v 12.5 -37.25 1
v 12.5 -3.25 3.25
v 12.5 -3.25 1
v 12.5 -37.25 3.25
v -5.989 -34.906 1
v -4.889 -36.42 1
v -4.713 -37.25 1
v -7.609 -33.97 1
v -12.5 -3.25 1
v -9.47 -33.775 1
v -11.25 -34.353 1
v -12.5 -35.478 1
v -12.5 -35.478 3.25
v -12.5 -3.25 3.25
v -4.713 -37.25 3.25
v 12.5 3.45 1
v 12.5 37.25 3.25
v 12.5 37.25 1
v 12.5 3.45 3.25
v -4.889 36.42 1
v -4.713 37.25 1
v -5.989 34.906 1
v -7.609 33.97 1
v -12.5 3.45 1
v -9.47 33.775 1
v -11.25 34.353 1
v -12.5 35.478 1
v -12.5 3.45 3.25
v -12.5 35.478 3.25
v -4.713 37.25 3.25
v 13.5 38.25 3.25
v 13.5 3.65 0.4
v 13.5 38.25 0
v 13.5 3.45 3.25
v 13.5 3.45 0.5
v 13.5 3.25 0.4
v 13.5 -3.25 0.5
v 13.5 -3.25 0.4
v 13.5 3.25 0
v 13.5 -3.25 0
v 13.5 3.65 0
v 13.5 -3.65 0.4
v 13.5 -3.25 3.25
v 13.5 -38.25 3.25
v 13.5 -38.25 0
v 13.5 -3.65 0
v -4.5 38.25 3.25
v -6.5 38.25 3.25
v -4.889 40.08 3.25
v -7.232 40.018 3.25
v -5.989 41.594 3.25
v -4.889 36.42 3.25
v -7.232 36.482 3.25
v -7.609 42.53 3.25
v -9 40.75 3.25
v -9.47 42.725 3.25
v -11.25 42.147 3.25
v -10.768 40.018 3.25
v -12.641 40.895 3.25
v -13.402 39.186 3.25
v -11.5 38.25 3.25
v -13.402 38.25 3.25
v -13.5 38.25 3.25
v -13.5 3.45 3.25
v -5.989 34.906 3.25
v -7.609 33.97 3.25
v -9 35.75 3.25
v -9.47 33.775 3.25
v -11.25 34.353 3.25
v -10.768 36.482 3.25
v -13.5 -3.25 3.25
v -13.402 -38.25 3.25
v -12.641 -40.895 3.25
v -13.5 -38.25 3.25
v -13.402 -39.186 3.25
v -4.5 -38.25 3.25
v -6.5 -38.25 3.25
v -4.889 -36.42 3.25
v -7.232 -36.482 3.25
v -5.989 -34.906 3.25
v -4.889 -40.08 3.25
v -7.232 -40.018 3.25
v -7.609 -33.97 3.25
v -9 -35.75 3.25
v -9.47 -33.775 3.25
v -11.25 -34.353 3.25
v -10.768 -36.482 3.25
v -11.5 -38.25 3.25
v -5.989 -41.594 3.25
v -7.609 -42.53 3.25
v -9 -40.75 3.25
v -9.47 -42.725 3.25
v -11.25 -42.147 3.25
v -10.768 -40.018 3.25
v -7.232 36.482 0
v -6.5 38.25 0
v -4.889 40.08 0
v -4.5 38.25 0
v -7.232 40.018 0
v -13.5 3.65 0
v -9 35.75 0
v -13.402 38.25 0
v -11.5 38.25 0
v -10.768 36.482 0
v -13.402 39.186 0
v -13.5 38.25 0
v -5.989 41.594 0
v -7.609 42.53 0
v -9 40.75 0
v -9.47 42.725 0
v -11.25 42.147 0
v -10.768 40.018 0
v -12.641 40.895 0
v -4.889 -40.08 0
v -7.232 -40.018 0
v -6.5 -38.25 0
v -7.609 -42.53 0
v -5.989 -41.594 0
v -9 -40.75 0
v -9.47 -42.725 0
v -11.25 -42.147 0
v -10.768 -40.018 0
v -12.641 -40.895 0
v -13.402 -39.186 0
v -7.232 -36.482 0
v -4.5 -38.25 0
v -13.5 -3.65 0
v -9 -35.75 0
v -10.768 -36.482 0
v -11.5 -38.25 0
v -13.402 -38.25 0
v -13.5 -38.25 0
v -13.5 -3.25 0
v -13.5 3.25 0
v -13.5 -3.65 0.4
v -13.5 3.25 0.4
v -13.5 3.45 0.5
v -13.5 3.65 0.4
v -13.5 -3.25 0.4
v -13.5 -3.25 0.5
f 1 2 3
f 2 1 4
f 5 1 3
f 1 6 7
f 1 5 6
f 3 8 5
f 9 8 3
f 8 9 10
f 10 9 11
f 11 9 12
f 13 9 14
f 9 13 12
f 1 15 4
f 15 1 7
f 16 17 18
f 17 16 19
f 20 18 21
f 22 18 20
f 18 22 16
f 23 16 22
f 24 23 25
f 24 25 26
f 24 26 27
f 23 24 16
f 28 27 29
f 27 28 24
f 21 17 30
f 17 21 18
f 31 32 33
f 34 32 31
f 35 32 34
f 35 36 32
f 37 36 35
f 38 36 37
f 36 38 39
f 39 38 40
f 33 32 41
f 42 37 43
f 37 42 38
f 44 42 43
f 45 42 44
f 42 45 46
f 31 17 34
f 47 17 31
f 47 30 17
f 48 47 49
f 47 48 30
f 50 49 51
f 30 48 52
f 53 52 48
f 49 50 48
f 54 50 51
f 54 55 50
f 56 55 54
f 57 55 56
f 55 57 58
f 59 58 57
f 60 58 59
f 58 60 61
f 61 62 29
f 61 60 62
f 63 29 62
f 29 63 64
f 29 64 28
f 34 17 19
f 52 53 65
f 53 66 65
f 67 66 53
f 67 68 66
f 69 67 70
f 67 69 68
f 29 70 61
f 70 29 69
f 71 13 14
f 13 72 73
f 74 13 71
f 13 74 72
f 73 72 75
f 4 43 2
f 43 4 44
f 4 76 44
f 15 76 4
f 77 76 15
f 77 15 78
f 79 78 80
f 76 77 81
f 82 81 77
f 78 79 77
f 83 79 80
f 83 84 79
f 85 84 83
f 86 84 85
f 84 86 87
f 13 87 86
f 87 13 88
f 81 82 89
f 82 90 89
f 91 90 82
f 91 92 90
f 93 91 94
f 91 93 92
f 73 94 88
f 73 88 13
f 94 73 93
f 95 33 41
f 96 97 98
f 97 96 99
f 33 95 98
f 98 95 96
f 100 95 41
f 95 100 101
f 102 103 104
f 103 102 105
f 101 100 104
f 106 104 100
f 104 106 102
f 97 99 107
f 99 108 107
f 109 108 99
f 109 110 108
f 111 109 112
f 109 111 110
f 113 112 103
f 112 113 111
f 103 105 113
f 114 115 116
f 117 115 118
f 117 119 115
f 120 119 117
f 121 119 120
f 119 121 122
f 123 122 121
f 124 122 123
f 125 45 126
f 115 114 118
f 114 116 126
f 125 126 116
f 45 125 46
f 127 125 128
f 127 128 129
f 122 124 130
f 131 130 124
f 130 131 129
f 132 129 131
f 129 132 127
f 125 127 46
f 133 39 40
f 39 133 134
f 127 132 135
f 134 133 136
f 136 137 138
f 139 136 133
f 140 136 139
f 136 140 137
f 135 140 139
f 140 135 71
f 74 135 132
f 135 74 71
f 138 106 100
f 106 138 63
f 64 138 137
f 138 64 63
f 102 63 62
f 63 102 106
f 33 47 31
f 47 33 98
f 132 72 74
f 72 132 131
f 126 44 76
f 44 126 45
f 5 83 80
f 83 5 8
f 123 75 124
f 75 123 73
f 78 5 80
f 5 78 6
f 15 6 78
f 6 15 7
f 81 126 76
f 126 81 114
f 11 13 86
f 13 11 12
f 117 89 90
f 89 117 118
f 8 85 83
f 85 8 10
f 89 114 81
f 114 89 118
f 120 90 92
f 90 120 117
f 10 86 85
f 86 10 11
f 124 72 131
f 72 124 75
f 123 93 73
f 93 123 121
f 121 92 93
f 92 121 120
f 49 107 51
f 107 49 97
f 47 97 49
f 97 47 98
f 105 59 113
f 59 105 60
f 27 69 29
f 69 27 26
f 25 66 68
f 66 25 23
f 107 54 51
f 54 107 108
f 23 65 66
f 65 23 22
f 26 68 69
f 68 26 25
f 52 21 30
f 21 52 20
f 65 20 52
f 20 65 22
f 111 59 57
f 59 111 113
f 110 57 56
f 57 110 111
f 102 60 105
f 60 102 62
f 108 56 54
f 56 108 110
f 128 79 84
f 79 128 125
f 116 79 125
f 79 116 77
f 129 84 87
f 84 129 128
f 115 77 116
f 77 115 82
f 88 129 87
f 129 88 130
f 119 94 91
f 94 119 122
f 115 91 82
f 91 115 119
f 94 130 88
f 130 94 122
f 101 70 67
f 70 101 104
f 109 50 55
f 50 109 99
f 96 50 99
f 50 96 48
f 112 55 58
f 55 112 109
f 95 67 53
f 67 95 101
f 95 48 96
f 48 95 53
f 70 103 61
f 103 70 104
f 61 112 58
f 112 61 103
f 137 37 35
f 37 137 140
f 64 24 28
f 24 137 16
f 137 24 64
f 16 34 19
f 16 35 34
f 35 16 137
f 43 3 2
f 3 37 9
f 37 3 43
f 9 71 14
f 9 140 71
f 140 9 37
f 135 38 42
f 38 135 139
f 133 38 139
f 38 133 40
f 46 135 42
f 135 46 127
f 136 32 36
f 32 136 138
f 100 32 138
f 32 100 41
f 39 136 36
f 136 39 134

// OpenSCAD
/* [Cards] */
// The number of SD cards you want to fit inside
number_of_cards = 2; // [1,2,3]

// The width of the SD card (mm)
card_width = 25; // [10:50]
// The height of the SD card (mm)
card_height = 34; // [10:50]
// The depth of the SD card (mm)
card_depth = 2.25; 

// The thickness you want the edges of the container to be (mm)
edge_thickness = 1; // [1,2]

/* [Hinge] */
// The thickness you want the hinge to be (mm)
hinge_thickness = 0.5; // 
// The dimensions of the gap used to help the 90 degree bends (mm)
hinge_bend_gap = 0.4; // 

/* [Loop] */
// The inner radius of the loop's hole (mm)
loop_hole_radius = 2.5; 
// The outer radius of the loop (mm)
loop_outer_radius = 4.5; 
// The location of the loop hole (mm)
loop_hole_location = 4.5;

fudge = 0.2;
halffudge = fudge / 2;

    container_depth = card_depth * number_of_cards;
    halfcontainer_depth = container_depth / 2;

    model_height = card_width + edge_thickness * 2;
    model_depth = halfcontainer_depth + edge_thickness;

    hole_depth = model_depth;

    // not including loop
    modelwidth = (card_height + edge_thickness + model_depth) * 2;

    // center x and y on axes
    translate([-model_height/2, -modelwidth/2, 0])
    difference() {
        union() {
            difference() {
                union() {
                    // main body
                    cube([model_height, modelwidth, model_depth], center = false);
                }
                union() {
                    // remove space for cards
                    translate([edge_thickness, edge_thickness, edge_thickness]) 
                    cube([card_width, card_height + fudge, halfcontainer_depth + fudge]);
                    translate([edge_thickness, card_height + edge_thickness + model_depth * 2, edge_thickness]) 
                    cube([card_width, card_height, halfcontainer_depth + fudge]);
                }
            }
            union() {
                // loop for keychain
                translate([loop_hole_location, 0, 0]) 
                cylinder(h = hole_depth, r = loop_outer_radius);    
                translate([loop_hole_location, modelwidth, 0]) 
                cylinder(h = hole_depth, r = loop_outer_radius);    
            }
        }
        union() {
            // hole in loop
            translate([loop_hole_location, 0, -halffudge]) 
            cylinder(h = hole_depth + fudge, r = loop_hole_radius);    
            translate([loop_hole_location, modelwidth, -halffudge]) 
            cylinder(h = hole_depth + fudge, r = loop_hole_radius);    

            // hinge area
            translate([-halffudge, card_height + edge_thickness, .5]) 
            cube([model_height + fudge, model_depth * 2 + fudge, model_depth - hinge_thickness + fudge]);

            // gap for bending
            translate([0, card_height + edge_thickness - hinge_bend_gap, 0]) 
            cube([model_height, hinge_bend_gap, hinge_bend_gap], center = false);
            translate([0, card_height + edge_thickness + model_depth * 2, 0]) 
            cube([model_height, hinge_bend_gap, hinge_bend_gap], center = false);
        }
    }
